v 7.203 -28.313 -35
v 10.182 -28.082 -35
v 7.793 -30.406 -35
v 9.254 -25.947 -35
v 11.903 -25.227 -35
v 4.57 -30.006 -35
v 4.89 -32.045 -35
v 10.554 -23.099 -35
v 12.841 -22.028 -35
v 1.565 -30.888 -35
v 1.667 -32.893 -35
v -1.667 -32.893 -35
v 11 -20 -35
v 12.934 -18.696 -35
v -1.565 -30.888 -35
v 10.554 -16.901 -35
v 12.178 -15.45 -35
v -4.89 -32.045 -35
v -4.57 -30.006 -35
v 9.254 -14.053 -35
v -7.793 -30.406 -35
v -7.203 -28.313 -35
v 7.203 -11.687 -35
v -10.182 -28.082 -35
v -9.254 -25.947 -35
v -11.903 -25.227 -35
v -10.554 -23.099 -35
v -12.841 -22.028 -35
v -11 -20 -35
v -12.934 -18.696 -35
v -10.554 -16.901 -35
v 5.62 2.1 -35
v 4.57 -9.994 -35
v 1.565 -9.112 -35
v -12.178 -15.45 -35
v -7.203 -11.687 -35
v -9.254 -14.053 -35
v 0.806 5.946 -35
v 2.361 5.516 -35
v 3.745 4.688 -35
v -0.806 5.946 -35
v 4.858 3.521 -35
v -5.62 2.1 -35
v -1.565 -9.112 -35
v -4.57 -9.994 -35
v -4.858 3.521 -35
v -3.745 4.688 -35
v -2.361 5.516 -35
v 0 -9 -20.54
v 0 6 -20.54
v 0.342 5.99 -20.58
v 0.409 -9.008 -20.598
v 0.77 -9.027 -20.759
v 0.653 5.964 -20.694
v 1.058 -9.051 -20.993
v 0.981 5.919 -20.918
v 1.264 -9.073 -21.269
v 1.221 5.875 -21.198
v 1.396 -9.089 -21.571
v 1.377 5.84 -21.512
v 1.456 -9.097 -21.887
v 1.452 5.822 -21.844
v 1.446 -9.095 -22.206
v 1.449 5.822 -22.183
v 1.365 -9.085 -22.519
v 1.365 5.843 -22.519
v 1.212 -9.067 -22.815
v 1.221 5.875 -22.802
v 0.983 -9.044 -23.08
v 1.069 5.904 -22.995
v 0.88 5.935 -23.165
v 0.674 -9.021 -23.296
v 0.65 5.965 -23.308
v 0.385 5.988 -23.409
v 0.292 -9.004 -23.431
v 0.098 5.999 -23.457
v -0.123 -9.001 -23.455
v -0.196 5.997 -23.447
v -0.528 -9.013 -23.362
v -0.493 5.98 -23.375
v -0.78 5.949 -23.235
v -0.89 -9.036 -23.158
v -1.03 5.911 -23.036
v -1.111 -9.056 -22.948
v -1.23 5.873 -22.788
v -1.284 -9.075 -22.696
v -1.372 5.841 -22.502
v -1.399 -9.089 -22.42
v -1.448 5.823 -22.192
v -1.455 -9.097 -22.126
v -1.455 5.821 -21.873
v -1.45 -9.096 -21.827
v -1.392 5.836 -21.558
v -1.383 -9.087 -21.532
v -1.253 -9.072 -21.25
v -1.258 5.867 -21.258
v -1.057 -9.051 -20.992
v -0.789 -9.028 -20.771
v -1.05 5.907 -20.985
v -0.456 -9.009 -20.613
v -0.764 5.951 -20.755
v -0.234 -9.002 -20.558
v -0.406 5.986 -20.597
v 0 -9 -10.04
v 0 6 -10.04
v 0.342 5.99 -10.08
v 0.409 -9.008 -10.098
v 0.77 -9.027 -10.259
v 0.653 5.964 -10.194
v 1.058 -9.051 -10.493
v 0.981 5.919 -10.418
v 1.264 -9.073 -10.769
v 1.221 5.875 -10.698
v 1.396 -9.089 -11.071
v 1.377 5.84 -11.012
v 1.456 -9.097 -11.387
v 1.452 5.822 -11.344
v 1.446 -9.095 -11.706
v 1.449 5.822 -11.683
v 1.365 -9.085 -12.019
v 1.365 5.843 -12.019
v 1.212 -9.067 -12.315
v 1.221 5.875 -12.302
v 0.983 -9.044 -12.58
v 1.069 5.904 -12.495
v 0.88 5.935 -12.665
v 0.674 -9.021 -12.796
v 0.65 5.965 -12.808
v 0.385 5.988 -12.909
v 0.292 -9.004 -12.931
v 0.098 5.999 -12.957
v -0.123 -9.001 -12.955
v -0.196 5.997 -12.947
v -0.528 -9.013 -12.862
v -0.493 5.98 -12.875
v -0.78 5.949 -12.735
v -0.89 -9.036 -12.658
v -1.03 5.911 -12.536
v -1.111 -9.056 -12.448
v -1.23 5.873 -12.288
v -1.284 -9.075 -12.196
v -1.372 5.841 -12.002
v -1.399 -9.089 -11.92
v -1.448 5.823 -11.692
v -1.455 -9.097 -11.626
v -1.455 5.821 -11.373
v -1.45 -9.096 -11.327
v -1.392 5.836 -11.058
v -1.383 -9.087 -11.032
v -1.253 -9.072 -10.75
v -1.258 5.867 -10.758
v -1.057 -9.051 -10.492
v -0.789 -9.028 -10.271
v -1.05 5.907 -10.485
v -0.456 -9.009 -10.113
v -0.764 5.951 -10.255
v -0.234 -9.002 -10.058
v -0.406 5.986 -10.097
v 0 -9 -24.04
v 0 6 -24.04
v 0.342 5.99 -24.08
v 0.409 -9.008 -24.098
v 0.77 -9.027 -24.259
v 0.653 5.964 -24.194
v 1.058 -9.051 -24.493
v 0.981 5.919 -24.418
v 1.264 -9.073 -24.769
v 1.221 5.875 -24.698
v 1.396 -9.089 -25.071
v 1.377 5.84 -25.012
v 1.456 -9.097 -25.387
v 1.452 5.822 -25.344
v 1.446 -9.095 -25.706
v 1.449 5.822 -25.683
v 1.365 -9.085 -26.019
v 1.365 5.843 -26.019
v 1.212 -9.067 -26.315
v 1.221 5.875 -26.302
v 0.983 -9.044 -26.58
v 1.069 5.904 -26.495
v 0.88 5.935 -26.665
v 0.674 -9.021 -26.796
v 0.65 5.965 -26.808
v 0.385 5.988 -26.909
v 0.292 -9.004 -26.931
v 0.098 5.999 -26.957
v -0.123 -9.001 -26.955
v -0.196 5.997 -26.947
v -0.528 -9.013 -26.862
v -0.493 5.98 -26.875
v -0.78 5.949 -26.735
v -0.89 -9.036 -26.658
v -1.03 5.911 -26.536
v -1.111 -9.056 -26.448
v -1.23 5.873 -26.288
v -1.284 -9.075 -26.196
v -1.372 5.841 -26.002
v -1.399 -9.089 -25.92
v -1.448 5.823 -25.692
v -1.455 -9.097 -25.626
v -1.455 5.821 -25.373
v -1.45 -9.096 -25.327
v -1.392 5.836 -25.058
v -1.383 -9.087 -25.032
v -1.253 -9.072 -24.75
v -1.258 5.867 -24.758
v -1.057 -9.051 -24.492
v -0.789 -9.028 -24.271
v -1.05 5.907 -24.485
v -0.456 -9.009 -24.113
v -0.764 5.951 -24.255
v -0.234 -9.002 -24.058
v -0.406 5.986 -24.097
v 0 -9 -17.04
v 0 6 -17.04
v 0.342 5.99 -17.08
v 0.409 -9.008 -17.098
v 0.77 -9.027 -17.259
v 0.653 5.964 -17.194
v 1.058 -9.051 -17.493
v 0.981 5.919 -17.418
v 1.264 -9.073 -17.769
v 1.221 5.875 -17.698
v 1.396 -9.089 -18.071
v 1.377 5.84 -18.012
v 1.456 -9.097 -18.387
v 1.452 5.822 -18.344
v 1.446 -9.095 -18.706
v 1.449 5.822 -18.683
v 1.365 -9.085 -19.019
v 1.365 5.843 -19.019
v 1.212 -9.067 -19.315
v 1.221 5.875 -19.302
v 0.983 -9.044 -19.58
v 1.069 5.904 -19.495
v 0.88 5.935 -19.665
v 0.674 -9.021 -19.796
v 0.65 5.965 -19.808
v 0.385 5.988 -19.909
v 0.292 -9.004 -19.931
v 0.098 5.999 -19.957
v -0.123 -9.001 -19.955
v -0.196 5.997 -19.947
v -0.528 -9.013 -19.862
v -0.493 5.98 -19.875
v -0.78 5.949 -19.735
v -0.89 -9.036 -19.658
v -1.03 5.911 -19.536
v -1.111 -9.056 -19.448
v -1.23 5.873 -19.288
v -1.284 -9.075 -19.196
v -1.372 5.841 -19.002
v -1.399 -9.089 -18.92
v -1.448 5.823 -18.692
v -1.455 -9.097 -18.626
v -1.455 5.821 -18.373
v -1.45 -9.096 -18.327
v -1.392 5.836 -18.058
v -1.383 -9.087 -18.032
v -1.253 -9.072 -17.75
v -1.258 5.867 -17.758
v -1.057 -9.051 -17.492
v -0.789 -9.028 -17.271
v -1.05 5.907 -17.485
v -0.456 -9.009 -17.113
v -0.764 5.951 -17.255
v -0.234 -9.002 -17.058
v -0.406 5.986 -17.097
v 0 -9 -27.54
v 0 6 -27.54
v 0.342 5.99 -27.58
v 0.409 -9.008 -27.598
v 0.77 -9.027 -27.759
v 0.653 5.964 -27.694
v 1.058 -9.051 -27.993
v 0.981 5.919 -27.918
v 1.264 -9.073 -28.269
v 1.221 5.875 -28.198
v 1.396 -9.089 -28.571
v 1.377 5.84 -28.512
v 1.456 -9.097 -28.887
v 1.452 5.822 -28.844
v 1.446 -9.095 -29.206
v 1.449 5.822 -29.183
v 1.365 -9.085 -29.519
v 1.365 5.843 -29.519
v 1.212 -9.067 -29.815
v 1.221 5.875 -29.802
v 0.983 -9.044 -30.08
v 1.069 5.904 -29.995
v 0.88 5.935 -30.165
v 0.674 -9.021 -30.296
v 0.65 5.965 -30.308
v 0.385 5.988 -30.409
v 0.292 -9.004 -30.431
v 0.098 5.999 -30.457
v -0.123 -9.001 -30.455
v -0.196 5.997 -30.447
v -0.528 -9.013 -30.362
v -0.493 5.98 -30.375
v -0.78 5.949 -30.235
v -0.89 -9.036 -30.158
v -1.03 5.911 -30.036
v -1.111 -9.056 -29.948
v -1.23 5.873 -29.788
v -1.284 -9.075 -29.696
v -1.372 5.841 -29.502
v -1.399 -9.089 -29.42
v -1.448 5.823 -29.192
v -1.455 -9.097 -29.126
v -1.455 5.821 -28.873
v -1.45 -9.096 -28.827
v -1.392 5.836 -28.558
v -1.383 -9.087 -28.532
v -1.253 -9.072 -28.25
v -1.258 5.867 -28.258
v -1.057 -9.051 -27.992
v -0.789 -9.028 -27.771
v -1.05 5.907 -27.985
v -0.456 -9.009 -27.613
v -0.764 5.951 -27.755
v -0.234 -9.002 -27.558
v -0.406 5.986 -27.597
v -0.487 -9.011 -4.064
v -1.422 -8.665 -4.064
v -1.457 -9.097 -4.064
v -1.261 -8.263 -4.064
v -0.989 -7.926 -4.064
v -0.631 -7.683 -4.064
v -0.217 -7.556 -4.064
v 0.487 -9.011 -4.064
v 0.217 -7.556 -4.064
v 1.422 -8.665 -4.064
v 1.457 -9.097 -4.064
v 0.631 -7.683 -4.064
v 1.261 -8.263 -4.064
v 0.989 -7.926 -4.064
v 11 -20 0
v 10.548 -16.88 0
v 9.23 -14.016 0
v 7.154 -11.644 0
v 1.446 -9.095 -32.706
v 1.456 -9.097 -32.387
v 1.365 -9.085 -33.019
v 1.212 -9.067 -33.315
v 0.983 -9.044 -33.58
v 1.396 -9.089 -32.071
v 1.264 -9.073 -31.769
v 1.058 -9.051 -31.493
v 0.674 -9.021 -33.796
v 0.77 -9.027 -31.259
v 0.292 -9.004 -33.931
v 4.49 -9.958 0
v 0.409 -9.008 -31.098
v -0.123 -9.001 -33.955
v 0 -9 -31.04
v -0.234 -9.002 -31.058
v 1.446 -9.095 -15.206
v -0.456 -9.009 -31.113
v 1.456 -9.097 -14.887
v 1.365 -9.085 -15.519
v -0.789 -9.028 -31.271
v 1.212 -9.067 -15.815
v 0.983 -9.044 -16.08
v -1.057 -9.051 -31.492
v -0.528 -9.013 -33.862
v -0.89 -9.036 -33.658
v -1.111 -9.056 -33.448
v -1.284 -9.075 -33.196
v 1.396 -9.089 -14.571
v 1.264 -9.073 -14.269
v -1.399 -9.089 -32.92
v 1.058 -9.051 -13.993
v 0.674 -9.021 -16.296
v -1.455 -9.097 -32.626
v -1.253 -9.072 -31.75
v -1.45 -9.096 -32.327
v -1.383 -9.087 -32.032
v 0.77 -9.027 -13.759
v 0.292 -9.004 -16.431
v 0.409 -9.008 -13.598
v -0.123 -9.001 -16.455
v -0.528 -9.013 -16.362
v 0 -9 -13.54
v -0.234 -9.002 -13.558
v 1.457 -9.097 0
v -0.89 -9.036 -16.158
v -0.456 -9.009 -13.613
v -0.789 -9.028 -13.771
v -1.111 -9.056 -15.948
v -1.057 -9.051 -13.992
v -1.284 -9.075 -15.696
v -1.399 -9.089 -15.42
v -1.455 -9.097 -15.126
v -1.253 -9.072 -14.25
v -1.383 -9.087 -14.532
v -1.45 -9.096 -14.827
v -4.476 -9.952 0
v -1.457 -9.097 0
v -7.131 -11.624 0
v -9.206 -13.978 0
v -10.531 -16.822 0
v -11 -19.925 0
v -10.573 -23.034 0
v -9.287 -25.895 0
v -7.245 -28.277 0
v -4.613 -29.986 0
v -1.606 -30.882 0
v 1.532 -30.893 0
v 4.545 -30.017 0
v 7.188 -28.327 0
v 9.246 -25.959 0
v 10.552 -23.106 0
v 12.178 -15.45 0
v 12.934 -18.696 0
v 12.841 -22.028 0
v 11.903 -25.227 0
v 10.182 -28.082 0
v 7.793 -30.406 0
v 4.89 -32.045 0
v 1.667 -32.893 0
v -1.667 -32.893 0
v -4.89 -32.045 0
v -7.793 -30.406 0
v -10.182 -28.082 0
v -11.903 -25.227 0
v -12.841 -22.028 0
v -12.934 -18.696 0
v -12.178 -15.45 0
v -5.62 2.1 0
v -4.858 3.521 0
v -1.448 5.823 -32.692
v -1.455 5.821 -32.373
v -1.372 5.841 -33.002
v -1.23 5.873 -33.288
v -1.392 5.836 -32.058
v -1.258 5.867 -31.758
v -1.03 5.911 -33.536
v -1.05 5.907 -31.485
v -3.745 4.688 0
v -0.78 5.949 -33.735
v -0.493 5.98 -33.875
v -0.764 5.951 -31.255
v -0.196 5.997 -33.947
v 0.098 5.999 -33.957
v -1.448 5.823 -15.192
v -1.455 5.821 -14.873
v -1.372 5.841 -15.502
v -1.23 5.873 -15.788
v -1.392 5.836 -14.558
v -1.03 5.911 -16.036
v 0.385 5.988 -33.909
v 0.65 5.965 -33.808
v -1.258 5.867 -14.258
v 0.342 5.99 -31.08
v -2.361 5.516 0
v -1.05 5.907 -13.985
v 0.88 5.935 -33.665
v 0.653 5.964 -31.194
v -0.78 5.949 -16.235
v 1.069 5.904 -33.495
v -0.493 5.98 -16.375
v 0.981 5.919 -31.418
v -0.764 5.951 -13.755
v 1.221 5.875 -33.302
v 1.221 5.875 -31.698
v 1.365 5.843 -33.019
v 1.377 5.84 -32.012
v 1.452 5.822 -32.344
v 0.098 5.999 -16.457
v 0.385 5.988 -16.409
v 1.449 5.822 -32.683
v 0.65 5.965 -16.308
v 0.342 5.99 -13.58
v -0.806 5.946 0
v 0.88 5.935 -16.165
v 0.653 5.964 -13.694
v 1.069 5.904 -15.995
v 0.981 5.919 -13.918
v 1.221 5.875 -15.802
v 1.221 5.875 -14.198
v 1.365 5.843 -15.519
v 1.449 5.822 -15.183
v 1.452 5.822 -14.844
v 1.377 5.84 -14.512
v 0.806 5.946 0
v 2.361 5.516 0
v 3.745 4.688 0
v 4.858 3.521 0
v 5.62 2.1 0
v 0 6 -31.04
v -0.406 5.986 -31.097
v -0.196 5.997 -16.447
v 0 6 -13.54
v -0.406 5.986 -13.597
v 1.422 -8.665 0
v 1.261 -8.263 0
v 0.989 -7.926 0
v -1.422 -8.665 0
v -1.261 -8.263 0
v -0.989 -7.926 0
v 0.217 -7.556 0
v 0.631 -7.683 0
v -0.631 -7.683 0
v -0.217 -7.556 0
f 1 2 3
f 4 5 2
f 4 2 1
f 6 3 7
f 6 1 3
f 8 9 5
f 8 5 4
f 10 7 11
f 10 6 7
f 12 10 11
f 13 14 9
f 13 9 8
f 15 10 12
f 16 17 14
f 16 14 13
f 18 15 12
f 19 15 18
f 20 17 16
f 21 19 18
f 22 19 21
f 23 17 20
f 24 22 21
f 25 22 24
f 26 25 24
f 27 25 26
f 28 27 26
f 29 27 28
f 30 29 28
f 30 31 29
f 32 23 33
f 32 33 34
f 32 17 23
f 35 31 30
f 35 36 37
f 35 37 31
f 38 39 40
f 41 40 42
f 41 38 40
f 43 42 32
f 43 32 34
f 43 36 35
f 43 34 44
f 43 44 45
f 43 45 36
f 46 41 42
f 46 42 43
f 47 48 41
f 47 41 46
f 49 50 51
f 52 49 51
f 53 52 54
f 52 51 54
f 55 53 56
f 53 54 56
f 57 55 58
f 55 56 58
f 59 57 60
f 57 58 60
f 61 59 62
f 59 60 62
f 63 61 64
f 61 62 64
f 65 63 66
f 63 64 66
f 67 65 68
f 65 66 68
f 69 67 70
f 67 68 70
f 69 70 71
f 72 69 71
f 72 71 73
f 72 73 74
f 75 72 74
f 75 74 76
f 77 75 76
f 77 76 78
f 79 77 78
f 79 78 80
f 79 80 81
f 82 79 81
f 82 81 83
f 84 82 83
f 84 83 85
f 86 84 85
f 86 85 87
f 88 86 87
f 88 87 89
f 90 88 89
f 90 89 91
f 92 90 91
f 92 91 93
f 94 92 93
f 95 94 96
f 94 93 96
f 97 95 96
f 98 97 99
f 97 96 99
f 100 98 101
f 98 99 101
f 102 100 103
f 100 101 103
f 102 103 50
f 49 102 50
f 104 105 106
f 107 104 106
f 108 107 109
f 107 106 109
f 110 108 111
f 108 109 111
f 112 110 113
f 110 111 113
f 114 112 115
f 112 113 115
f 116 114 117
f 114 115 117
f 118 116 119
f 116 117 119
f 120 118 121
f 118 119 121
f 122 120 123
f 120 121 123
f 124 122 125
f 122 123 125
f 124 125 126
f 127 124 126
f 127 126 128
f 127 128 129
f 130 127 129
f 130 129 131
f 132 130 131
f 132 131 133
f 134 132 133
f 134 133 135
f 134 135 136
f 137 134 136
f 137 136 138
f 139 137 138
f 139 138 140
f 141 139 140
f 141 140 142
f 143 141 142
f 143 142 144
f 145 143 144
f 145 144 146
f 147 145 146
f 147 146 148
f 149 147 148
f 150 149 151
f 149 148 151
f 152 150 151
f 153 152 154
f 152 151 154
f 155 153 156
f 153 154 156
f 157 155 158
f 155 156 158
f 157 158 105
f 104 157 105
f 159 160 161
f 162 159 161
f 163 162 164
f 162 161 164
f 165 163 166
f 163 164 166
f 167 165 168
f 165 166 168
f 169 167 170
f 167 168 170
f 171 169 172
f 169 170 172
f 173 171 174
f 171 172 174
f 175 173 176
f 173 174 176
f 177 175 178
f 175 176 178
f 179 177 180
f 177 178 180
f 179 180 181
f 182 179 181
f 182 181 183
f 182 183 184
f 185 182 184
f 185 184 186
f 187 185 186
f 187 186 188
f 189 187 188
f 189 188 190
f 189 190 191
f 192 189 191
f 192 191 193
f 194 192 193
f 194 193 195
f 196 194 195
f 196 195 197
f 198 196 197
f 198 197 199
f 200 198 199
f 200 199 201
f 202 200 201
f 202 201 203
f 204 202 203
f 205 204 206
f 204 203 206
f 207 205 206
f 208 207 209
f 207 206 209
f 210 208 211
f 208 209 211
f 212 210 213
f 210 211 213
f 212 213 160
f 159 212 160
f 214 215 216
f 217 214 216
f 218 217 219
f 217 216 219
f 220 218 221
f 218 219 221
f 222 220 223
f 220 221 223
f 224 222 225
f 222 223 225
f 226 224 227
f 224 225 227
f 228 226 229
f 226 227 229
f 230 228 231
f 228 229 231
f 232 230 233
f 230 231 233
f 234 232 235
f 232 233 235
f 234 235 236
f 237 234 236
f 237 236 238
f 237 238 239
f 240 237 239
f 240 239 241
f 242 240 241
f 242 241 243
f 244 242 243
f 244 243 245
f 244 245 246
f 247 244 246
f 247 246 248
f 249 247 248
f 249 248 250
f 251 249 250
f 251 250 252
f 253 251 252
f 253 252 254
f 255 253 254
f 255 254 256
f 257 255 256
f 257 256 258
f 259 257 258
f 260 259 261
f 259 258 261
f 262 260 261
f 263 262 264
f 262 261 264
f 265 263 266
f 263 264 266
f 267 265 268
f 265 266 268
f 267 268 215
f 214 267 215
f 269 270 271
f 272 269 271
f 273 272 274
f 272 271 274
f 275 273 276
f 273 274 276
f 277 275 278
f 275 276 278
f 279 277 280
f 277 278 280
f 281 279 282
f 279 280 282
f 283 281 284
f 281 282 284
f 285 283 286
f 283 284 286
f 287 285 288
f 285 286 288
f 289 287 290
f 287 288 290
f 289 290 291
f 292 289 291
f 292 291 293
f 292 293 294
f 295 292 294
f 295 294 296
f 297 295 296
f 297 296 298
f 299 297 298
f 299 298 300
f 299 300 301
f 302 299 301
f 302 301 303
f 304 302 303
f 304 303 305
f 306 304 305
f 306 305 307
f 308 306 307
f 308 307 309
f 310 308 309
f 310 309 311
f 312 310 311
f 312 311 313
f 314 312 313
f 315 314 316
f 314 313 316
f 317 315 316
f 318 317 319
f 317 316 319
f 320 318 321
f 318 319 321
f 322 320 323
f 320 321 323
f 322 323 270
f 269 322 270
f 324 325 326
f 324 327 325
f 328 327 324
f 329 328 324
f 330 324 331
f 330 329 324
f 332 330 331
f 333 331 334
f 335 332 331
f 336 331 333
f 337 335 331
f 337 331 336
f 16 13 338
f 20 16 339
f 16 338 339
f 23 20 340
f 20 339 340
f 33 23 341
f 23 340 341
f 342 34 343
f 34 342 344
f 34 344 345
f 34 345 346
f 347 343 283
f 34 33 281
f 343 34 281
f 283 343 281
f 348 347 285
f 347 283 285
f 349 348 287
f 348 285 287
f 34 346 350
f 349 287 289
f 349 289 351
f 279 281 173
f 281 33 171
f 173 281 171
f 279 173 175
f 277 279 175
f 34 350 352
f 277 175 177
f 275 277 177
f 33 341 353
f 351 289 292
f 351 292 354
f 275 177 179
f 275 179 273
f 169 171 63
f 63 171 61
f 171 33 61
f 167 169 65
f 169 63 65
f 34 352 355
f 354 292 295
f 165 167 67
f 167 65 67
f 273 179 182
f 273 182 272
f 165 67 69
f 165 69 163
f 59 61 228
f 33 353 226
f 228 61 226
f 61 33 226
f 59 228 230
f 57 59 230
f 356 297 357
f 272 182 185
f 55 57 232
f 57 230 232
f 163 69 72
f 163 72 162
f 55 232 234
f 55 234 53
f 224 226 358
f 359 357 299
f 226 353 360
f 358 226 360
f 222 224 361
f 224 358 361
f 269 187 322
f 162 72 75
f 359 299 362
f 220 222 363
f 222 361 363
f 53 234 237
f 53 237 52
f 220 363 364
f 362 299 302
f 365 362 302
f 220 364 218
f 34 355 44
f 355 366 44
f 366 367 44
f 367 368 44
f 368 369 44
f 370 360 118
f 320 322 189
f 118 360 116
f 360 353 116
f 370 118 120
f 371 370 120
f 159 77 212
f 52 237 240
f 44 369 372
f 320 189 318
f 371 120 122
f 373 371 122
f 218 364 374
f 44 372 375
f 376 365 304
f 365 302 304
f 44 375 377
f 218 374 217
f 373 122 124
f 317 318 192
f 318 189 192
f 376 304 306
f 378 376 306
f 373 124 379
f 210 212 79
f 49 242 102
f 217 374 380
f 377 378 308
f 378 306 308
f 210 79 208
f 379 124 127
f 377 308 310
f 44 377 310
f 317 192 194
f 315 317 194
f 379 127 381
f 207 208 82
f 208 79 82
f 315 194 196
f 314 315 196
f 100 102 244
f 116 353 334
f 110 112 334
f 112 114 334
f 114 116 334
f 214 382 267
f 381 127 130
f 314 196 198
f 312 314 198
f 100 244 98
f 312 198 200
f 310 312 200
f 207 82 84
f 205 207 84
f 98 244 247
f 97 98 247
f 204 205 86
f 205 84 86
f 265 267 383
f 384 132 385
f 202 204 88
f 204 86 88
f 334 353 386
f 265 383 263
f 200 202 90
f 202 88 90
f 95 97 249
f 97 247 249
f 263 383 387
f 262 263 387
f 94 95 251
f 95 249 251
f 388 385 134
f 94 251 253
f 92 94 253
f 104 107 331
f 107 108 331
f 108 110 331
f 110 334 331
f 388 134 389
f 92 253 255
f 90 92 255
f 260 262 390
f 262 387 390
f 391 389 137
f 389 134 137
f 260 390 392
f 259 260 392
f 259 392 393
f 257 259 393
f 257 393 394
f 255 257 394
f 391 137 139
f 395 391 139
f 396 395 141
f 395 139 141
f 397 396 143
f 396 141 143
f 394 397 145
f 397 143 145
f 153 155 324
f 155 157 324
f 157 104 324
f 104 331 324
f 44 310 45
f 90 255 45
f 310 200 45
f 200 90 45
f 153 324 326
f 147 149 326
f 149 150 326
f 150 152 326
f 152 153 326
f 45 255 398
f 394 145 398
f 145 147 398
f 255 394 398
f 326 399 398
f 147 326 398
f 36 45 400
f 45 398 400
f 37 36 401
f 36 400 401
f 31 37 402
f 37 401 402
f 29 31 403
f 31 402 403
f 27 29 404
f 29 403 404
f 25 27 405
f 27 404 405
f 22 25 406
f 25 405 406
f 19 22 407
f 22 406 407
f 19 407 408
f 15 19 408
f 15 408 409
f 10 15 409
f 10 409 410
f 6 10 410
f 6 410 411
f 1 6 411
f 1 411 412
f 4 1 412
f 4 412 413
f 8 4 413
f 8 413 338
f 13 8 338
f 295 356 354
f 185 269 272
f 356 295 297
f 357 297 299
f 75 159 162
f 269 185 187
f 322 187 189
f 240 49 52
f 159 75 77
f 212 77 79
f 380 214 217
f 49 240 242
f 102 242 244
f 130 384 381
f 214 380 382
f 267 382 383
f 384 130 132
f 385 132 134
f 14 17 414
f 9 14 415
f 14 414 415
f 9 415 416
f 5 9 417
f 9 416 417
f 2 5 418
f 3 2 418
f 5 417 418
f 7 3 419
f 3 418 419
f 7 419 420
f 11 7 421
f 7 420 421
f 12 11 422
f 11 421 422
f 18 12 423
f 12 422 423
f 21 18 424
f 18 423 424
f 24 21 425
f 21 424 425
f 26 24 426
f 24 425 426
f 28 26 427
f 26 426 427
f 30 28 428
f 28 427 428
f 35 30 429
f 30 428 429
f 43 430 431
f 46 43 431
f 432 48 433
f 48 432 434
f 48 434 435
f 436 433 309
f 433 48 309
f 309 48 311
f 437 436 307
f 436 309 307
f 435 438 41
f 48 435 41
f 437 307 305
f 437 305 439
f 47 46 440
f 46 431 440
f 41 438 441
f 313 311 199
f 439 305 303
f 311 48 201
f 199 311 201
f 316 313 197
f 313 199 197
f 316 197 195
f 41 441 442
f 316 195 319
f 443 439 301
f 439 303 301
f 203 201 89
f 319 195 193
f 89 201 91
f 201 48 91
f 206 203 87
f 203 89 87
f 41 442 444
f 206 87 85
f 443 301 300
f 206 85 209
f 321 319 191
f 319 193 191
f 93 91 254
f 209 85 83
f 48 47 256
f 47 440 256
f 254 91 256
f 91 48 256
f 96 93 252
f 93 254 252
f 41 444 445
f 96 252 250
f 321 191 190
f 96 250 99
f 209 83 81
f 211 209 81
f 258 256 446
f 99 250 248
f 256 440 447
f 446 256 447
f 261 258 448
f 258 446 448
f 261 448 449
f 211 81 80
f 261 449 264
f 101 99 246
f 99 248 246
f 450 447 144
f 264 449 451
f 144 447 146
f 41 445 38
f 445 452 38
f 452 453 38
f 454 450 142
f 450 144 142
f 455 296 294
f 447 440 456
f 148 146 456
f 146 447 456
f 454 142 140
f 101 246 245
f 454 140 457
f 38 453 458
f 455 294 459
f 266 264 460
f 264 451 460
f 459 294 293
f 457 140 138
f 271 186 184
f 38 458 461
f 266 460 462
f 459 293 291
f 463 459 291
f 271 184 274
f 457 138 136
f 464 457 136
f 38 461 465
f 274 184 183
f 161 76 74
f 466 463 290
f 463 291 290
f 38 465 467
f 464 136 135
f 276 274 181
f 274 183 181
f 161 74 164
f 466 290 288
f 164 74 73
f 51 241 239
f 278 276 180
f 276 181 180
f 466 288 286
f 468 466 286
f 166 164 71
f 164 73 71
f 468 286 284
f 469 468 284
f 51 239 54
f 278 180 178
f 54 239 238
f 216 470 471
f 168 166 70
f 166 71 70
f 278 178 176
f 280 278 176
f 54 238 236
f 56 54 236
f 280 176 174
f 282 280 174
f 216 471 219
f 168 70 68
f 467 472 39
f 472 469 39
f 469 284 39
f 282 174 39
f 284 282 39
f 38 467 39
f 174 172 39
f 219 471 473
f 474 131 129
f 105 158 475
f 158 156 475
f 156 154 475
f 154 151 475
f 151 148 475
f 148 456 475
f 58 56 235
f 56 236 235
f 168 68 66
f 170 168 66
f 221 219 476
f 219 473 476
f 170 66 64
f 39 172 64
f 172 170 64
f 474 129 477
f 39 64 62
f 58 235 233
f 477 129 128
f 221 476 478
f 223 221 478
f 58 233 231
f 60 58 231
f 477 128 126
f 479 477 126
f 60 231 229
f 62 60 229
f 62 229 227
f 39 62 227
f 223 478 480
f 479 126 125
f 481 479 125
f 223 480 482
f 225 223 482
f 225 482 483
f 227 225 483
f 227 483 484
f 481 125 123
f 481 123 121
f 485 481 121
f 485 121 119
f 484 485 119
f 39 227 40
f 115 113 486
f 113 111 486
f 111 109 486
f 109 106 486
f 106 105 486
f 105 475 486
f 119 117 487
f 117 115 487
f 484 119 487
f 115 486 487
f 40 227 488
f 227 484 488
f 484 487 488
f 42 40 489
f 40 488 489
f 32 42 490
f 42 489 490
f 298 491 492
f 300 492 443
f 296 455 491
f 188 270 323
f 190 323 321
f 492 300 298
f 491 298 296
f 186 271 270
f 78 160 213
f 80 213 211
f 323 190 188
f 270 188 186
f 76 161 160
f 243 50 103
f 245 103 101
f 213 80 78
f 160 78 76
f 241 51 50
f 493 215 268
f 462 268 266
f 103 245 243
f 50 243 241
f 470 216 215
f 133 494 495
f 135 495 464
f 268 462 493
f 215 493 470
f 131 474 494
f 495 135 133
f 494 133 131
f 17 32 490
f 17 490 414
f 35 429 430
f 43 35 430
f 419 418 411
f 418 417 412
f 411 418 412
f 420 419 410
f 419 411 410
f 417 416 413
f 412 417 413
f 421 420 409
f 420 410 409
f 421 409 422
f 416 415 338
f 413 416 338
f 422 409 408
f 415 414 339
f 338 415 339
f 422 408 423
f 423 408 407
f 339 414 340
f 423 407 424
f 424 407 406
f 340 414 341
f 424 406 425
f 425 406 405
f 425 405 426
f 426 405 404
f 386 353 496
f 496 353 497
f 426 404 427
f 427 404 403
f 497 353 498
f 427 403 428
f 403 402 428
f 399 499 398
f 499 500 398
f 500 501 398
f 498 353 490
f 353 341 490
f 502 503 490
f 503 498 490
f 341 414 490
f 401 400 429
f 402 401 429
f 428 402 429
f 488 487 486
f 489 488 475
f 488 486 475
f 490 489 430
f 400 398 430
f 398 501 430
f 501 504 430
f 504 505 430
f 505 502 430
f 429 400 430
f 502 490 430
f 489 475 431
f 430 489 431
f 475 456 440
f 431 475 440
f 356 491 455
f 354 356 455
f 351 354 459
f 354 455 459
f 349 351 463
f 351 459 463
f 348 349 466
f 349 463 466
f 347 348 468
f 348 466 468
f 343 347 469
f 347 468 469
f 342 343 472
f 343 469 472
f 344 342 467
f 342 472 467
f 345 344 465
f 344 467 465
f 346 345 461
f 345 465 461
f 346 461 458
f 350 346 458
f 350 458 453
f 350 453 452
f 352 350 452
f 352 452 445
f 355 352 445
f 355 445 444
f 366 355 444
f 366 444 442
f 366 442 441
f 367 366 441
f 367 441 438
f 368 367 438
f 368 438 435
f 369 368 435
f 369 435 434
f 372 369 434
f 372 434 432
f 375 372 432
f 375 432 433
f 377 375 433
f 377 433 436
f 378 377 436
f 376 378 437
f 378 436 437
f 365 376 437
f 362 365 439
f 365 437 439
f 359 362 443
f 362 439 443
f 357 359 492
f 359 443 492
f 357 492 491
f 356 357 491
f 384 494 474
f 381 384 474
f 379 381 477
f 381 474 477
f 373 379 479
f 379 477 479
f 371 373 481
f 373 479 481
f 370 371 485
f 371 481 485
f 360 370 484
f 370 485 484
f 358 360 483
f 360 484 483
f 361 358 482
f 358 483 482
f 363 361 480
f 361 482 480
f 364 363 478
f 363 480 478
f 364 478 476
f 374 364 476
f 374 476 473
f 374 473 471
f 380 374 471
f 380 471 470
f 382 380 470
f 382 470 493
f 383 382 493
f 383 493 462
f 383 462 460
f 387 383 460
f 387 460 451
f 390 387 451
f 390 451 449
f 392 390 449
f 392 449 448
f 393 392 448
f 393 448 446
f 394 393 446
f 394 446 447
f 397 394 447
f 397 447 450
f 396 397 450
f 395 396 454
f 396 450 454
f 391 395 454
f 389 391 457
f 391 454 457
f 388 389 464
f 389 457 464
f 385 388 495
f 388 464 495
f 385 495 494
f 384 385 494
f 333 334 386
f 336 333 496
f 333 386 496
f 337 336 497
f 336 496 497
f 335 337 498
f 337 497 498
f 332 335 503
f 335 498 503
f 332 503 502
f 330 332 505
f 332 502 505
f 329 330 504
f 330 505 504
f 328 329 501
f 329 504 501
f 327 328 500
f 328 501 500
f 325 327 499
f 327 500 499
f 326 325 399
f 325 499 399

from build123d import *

# Parameters (mm, degrees)
BOSS_EXTRUDE2_DEPTH     = 35
SKETCH2_R               = 11
CUT_EXTRUDE1_DEPTH      = 35
SKETCH3_R               = 1.4605
CUT_EXTRUDE2_DEPTH      = 4.064
CUT_EXTRUDE3_REACH      = 55.991
CUT_EXTRUDE3_END_RADIUS = 11
SKETCH4_R               = 1.4605
LPATTERN1_COUNT         = 7
LPATTERN1_PITCH         = 3.5


with BuildPart() as part:
    # Sketch1 → Boss-Extrude2 (new body)
    with BuildSketch(Plane.XY):
        with BuildLine():
            Line((-12.177746097, -15.45), (-5.620498199, 2.1))
            ThreePointArc((-5.620498199, 2.1), (0, 6), (5.620498199, 2.1))
            Line((5.620498199, 2.1), (12.177746097, -15.45))
            ThreePointArc((12.177746097, -15.45), (0, -33), (-12.177746097, -15.45))
        make_face()
    extrude(amount=-BOSS_EXTRUDE2_DEPTH)

    # Sketch2 → Cut-Extrude1 (cut)
    with BuildSketch(Plane.XY):
        with Locations((0, -20)):
            Circle(SKETCH2_R)
    extrude(amount=-CUT_EXTRUDE1_DEPTH, mode=Mode.SUBTRACT)

    # Sketch3 → Cut-Extrude2 (cut)
    with BuildSketch(Plane.XY):
        with Locations((0, -9)):
            Circle(SKETCH3_R)
    extrude(amount=-CUT_EXTRUDE2_DEPTH, mode=Mode.SUBTRACT)

    # Cut-Extrude3: up to this cylinder (the profile starts outside it)
    cut_extrude3_end = Plane(origin=(0, -20, -32.5), z_dir=(0, 0, 1)) * Cylinder(CUT_EXTRUDE3_END_RADIUS, 134.982, mode=Mode.PRIVATE)
    # Sketch4 → Cut-Extrude3 (cut, up to the surface)
    with BuildSketch(Plane(origin=(0, 6, 0), x_dir=(1, 0, 0), z_dir=(0, 1, 0)), mode=Mode.PRIVATE) as cut_extrude3_sk1:
        with Locations(Location((0, 32.5, 0), (0, 0, 270))):
            Circle(SKETCH4_R)
    cut_extrude3_tool1 = extrude(cut_extrude3_sk1.sketch, amount=-CUT_EXTRUDE3_REACH, mode=Mode.PRIVATE) - cut_extrude3_end
    cut_extrude3 = cut_extrude3_tool1.solids().sort_by_distance((0, 6, -32.5))[0]
    add(cut_extrude3, mode=Mode.SUBTRACT)

    # LPattern1: Cut-Extrude3 ×7
    with Locations(*[(0, 0, i * LPATTERN1_PITCH) for i in range(1, LPATTERN1_COUNT)]):
        add(cut_extrude3, mode=Mode.SUBTRACT)


solid = part.part
